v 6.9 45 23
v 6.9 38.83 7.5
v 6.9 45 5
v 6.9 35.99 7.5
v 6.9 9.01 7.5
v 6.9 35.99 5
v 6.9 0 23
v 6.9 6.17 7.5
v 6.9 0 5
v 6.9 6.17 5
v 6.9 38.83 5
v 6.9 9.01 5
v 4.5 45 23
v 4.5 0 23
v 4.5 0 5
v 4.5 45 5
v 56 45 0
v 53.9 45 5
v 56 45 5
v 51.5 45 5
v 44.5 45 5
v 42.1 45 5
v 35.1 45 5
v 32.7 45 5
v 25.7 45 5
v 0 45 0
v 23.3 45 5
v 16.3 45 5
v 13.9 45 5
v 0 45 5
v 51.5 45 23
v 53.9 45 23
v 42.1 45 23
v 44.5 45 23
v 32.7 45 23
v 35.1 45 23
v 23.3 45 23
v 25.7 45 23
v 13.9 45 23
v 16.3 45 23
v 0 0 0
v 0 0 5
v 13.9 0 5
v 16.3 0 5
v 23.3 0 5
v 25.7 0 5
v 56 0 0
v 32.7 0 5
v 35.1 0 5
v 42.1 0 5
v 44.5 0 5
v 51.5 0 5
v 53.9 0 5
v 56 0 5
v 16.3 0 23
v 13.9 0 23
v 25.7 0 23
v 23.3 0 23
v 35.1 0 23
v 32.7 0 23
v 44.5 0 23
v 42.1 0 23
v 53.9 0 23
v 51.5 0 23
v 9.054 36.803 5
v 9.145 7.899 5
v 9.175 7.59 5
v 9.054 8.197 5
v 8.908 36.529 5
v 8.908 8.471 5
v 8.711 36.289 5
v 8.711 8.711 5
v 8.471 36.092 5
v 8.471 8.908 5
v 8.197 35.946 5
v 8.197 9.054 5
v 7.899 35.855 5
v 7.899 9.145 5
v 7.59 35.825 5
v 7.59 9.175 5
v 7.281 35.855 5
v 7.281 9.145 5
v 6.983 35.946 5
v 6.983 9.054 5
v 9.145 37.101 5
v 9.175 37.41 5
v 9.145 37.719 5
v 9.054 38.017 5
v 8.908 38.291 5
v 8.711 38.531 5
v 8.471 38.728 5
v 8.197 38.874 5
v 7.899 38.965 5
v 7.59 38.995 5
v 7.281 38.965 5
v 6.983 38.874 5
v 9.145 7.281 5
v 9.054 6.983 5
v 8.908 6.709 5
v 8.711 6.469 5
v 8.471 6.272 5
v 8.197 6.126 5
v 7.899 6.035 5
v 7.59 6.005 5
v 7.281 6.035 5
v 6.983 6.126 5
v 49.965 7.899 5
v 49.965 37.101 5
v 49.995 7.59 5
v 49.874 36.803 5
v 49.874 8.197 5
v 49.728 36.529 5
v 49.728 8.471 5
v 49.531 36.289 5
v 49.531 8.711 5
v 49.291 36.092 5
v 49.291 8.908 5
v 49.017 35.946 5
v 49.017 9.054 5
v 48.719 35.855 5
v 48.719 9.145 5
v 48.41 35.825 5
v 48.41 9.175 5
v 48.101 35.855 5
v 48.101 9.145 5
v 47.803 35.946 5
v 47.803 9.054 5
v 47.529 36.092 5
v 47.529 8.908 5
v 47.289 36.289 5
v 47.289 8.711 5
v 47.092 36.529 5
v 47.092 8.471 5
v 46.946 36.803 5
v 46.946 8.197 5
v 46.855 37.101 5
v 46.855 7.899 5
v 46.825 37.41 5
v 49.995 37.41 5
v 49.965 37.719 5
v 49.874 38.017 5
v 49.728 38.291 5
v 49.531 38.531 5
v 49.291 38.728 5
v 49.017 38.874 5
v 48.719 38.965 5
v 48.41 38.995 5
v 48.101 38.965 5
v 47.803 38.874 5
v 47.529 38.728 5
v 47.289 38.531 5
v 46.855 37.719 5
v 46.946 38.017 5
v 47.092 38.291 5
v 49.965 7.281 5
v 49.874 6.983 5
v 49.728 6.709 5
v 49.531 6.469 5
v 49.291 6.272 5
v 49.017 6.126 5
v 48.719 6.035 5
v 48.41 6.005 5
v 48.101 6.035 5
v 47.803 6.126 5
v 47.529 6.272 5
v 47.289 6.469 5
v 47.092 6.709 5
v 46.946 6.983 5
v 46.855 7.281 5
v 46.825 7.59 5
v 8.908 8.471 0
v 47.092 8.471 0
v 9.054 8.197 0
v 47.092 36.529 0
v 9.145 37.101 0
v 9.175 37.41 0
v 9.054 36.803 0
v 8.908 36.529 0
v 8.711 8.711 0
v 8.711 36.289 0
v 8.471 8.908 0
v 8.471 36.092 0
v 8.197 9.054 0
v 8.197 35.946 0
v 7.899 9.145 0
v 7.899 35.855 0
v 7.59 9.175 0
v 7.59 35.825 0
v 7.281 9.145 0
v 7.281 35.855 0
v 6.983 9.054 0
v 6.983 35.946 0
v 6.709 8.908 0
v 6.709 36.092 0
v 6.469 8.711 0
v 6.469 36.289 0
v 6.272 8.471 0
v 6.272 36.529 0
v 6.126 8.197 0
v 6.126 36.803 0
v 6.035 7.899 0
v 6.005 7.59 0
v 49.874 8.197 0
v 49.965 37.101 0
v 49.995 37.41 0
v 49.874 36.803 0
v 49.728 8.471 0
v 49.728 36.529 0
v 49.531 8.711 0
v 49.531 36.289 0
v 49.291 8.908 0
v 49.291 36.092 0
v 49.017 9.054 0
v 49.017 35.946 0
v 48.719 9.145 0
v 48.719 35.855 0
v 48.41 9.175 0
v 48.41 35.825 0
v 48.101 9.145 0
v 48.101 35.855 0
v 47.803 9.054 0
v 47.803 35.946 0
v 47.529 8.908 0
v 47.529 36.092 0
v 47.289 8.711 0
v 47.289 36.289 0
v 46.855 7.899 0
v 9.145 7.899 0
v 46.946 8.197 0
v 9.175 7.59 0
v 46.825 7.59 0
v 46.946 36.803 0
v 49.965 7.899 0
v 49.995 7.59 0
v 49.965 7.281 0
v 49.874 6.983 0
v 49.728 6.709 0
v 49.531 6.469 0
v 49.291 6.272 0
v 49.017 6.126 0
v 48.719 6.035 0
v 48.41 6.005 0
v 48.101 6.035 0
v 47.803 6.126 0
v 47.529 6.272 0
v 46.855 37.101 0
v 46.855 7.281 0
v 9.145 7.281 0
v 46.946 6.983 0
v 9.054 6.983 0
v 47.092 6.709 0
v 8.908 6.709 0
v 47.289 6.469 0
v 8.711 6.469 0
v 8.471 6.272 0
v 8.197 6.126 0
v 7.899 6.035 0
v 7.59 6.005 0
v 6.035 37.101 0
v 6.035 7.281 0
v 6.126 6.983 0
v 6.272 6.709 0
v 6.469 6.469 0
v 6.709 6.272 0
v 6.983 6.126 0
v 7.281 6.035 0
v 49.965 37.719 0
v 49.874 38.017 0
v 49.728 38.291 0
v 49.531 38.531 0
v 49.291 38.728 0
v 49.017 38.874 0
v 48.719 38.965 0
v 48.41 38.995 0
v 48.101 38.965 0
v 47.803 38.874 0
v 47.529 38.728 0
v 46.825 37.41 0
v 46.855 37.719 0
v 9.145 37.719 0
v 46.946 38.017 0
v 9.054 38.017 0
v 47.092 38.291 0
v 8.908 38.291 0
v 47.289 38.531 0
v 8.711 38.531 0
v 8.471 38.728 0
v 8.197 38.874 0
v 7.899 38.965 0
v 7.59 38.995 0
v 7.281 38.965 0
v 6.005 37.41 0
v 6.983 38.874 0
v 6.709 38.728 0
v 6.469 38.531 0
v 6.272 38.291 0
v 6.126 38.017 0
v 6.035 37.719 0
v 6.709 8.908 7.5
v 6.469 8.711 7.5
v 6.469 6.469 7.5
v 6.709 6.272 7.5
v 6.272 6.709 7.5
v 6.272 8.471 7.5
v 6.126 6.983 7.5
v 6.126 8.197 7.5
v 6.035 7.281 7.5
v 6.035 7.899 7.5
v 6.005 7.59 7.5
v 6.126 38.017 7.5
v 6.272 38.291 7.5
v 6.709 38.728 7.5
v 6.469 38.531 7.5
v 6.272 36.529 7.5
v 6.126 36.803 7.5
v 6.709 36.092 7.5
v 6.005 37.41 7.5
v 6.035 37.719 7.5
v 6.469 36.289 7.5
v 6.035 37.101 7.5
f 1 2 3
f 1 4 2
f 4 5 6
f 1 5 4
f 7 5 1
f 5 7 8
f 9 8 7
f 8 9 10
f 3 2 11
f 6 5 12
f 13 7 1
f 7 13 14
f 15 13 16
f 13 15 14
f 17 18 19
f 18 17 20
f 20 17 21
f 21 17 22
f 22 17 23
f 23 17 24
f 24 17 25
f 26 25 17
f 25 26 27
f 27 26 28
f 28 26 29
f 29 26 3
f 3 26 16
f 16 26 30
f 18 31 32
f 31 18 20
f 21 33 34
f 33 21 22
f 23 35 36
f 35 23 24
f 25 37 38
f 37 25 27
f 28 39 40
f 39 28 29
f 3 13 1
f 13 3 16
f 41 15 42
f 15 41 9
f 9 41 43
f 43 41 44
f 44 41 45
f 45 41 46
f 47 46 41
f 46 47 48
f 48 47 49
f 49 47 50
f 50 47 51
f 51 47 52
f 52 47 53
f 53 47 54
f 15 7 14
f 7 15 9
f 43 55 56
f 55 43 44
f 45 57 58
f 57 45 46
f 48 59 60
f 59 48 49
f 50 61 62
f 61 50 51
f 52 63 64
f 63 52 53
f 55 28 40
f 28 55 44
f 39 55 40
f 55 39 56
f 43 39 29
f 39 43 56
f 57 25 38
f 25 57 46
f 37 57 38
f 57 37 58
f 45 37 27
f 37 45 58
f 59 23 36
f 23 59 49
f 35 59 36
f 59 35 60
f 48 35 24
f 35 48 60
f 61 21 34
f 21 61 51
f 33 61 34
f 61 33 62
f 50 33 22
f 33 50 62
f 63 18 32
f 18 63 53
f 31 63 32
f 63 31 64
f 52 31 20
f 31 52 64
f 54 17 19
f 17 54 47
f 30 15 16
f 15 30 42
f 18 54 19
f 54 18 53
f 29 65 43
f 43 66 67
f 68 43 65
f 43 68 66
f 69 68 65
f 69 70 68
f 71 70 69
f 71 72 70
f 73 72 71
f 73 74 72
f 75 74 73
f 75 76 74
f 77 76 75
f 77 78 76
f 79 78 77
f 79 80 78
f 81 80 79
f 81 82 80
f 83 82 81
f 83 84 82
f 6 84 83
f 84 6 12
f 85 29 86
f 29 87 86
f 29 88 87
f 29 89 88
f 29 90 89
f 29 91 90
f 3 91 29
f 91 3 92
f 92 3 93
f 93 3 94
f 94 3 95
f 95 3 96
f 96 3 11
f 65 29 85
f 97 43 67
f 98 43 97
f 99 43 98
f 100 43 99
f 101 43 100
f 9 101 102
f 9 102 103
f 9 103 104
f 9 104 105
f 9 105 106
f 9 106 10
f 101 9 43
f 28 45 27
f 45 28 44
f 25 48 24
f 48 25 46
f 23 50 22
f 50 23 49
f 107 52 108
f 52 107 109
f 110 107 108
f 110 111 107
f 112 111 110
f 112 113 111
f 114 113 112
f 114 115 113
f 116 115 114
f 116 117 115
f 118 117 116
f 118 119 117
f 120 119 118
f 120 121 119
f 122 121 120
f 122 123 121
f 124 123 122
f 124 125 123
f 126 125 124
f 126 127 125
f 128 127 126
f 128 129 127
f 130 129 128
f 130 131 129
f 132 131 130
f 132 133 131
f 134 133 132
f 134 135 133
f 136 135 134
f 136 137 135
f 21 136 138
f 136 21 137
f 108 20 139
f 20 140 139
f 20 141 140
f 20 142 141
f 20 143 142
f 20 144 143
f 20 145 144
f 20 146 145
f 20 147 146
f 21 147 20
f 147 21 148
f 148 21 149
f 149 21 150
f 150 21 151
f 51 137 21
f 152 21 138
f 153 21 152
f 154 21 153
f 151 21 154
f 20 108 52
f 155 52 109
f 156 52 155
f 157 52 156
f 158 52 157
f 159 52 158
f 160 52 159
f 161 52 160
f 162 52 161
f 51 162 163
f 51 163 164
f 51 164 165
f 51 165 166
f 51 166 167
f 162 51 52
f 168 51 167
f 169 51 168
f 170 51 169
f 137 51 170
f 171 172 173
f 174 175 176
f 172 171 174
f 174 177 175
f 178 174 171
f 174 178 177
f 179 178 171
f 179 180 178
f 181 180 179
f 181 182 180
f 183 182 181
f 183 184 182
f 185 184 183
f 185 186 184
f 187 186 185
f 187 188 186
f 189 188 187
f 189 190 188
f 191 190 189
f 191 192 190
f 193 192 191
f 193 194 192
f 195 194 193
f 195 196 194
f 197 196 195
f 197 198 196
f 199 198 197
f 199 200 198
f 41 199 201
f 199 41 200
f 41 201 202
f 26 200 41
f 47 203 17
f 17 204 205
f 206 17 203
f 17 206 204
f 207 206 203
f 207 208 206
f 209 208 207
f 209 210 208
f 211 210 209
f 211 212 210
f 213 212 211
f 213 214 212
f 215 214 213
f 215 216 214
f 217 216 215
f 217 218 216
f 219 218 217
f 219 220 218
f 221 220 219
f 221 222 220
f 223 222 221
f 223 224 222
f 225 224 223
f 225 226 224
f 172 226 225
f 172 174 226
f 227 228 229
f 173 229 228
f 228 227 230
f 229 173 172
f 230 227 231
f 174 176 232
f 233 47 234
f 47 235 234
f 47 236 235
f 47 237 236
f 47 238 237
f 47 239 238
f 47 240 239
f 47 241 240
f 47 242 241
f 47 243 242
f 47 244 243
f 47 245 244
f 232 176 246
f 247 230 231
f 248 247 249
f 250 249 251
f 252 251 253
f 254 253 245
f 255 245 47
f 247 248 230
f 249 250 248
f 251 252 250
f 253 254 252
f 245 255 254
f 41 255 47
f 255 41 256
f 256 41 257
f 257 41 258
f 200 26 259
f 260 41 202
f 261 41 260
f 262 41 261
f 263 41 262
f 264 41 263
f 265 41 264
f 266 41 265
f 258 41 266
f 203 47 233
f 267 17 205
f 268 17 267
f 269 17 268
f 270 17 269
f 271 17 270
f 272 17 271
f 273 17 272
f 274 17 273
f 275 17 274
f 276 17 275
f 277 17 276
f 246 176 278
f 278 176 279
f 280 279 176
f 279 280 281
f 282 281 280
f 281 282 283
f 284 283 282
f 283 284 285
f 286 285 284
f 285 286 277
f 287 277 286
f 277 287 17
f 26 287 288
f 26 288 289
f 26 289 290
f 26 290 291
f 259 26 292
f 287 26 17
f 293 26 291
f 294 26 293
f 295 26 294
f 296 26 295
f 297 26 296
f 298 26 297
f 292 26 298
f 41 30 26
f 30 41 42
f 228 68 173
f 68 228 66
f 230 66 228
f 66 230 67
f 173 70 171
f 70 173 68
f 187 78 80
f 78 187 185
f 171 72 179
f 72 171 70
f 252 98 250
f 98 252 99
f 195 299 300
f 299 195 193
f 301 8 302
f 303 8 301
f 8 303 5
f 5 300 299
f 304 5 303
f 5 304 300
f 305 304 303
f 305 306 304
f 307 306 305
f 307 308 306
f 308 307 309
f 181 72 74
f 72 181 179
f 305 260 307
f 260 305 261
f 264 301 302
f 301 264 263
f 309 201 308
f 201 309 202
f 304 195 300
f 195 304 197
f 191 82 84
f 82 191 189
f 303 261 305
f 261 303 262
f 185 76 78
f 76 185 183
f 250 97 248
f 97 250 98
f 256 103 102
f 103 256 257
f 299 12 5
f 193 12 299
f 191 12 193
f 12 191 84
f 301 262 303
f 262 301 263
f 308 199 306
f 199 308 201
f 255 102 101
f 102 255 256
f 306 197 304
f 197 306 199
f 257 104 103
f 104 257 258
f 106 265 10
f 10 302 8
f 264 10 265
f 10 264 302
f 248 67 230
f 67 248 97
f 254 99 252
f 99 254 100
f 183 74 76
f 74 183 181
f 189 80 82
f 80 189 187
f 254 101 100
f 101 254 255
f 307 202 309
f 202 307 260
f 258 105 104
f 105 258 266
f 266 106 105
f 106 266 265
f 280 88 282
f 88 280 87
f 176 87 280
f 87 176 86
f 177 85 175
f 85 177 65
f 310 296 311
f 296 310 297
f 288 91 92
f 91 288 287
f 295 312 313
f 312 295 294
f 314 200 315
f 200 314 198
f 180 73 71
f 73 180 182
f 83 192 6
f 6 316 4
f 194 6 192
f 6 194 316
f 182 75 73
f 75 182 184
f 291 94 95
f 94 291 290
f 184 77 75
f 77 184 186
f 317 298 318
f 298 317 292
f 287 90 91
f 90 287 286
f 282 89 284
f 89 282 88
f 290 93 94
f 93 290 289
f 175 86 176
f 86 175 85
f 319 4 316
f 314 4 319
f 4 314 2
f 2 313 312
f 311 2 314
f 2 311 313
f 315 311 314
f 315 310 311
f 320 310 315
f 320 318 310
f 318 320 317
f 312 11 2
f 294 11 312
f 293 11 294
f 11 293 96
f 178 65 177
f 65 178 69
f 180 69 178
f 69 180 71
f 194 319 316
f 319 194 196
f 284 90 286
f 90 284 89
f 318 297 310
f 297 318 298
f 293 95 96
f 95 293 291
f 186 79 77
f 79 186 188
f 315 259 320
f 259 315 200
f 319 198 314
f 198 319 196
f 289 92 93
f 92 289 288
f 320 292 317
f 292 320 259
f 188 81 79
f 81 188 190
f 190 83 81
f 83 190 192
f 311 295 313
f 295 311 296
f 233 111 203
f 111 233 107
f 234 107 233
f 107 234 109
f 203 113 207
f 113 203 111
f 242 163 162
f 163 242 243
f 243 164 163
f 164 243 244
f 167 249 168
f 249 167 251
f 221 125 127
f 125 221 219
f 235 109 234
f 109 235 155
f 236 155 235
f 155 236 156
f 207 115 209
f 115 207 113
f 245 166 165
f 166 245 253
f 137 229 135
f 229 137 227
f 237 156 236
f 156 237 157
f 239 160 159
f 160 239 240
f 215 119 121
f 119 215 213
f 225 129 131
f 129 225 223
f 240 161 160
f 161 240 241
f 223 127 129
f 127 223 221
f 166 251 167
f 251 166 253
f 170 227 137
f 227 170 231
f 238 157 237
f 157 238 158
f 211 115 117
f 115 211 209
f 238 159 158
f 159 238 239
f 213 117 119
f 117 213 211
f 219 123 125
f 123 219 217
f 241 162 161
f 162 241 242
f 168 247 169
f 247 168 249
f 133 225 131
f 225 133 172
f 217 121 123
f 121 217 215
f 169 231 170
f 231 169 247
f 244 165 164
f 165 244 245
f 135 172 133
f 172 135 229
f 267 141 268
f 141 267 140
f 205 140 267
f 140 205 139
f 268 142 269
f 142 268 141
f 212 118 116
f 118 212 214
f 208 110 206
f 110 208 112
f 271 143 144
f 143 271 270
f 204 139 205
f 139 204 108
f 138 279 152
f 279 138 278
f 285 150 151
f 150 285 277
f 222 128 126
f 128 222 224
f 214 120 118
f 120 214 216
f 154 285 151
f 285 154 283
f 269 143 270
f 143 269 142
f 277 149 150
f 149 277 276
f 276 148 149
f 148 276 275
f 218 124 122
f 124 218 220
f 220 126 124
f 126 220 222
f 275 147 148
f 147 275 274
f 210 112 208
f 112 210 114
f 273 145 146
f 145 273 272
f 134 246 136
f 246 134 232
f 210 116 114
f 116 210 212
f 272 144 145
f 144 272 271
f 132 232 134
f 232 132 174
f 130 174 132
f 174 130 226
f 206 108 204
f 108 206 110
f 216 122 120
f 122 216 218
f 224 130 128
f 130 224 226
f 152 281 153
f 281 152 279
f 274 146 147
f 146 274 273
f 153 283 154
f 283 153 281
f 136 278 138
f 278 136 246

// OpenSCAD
$fn = 32;

// ----------------------------------------------------------------------
// Finned heat sink: 56 x 45 mm base, 18 mm fins
// ----------------------------------------------------------------------

// --- parameters (mm) ---
base_w = 56;              // base width
base_d = 45;              // base depth
base_t = 5;               // base thickness
fin_h = 18;               // fin height above the base
holes_d = 3.17;           // fixing holes
hole_x = 20.41;           // hole offset in x
hole_y = 14.91;           // hole offset in y
fin_t = 2.4;              // fin thickness
fin_pitch = 9.4;          // fin pitch
fin_count = 6;            // number of fins
fin_x0 = 4.5;             // first fin offset

difference() {
  union() {
    cube([base_w, base_d, base_t]);
    for (i = [0 : fin_count - 1]) {
      translate([fin_x0 + i * fin_pitch, 0, base_t - 0.5]) cube([fin_t, base_d, fin_h + 0.5]);
    }
  }
  /* fixing holes through the base, 2.5 mm clear on both sides */
  for (hx = [-20.41, 20.41]) {
    for (hy = [-14.91, 14.91]) {
      translate([base_w / 2 + hx, base_d / 2 + hy, -2.5]) cylinder(h = base_t + 5, d = holes_d);
    }
  }
}
